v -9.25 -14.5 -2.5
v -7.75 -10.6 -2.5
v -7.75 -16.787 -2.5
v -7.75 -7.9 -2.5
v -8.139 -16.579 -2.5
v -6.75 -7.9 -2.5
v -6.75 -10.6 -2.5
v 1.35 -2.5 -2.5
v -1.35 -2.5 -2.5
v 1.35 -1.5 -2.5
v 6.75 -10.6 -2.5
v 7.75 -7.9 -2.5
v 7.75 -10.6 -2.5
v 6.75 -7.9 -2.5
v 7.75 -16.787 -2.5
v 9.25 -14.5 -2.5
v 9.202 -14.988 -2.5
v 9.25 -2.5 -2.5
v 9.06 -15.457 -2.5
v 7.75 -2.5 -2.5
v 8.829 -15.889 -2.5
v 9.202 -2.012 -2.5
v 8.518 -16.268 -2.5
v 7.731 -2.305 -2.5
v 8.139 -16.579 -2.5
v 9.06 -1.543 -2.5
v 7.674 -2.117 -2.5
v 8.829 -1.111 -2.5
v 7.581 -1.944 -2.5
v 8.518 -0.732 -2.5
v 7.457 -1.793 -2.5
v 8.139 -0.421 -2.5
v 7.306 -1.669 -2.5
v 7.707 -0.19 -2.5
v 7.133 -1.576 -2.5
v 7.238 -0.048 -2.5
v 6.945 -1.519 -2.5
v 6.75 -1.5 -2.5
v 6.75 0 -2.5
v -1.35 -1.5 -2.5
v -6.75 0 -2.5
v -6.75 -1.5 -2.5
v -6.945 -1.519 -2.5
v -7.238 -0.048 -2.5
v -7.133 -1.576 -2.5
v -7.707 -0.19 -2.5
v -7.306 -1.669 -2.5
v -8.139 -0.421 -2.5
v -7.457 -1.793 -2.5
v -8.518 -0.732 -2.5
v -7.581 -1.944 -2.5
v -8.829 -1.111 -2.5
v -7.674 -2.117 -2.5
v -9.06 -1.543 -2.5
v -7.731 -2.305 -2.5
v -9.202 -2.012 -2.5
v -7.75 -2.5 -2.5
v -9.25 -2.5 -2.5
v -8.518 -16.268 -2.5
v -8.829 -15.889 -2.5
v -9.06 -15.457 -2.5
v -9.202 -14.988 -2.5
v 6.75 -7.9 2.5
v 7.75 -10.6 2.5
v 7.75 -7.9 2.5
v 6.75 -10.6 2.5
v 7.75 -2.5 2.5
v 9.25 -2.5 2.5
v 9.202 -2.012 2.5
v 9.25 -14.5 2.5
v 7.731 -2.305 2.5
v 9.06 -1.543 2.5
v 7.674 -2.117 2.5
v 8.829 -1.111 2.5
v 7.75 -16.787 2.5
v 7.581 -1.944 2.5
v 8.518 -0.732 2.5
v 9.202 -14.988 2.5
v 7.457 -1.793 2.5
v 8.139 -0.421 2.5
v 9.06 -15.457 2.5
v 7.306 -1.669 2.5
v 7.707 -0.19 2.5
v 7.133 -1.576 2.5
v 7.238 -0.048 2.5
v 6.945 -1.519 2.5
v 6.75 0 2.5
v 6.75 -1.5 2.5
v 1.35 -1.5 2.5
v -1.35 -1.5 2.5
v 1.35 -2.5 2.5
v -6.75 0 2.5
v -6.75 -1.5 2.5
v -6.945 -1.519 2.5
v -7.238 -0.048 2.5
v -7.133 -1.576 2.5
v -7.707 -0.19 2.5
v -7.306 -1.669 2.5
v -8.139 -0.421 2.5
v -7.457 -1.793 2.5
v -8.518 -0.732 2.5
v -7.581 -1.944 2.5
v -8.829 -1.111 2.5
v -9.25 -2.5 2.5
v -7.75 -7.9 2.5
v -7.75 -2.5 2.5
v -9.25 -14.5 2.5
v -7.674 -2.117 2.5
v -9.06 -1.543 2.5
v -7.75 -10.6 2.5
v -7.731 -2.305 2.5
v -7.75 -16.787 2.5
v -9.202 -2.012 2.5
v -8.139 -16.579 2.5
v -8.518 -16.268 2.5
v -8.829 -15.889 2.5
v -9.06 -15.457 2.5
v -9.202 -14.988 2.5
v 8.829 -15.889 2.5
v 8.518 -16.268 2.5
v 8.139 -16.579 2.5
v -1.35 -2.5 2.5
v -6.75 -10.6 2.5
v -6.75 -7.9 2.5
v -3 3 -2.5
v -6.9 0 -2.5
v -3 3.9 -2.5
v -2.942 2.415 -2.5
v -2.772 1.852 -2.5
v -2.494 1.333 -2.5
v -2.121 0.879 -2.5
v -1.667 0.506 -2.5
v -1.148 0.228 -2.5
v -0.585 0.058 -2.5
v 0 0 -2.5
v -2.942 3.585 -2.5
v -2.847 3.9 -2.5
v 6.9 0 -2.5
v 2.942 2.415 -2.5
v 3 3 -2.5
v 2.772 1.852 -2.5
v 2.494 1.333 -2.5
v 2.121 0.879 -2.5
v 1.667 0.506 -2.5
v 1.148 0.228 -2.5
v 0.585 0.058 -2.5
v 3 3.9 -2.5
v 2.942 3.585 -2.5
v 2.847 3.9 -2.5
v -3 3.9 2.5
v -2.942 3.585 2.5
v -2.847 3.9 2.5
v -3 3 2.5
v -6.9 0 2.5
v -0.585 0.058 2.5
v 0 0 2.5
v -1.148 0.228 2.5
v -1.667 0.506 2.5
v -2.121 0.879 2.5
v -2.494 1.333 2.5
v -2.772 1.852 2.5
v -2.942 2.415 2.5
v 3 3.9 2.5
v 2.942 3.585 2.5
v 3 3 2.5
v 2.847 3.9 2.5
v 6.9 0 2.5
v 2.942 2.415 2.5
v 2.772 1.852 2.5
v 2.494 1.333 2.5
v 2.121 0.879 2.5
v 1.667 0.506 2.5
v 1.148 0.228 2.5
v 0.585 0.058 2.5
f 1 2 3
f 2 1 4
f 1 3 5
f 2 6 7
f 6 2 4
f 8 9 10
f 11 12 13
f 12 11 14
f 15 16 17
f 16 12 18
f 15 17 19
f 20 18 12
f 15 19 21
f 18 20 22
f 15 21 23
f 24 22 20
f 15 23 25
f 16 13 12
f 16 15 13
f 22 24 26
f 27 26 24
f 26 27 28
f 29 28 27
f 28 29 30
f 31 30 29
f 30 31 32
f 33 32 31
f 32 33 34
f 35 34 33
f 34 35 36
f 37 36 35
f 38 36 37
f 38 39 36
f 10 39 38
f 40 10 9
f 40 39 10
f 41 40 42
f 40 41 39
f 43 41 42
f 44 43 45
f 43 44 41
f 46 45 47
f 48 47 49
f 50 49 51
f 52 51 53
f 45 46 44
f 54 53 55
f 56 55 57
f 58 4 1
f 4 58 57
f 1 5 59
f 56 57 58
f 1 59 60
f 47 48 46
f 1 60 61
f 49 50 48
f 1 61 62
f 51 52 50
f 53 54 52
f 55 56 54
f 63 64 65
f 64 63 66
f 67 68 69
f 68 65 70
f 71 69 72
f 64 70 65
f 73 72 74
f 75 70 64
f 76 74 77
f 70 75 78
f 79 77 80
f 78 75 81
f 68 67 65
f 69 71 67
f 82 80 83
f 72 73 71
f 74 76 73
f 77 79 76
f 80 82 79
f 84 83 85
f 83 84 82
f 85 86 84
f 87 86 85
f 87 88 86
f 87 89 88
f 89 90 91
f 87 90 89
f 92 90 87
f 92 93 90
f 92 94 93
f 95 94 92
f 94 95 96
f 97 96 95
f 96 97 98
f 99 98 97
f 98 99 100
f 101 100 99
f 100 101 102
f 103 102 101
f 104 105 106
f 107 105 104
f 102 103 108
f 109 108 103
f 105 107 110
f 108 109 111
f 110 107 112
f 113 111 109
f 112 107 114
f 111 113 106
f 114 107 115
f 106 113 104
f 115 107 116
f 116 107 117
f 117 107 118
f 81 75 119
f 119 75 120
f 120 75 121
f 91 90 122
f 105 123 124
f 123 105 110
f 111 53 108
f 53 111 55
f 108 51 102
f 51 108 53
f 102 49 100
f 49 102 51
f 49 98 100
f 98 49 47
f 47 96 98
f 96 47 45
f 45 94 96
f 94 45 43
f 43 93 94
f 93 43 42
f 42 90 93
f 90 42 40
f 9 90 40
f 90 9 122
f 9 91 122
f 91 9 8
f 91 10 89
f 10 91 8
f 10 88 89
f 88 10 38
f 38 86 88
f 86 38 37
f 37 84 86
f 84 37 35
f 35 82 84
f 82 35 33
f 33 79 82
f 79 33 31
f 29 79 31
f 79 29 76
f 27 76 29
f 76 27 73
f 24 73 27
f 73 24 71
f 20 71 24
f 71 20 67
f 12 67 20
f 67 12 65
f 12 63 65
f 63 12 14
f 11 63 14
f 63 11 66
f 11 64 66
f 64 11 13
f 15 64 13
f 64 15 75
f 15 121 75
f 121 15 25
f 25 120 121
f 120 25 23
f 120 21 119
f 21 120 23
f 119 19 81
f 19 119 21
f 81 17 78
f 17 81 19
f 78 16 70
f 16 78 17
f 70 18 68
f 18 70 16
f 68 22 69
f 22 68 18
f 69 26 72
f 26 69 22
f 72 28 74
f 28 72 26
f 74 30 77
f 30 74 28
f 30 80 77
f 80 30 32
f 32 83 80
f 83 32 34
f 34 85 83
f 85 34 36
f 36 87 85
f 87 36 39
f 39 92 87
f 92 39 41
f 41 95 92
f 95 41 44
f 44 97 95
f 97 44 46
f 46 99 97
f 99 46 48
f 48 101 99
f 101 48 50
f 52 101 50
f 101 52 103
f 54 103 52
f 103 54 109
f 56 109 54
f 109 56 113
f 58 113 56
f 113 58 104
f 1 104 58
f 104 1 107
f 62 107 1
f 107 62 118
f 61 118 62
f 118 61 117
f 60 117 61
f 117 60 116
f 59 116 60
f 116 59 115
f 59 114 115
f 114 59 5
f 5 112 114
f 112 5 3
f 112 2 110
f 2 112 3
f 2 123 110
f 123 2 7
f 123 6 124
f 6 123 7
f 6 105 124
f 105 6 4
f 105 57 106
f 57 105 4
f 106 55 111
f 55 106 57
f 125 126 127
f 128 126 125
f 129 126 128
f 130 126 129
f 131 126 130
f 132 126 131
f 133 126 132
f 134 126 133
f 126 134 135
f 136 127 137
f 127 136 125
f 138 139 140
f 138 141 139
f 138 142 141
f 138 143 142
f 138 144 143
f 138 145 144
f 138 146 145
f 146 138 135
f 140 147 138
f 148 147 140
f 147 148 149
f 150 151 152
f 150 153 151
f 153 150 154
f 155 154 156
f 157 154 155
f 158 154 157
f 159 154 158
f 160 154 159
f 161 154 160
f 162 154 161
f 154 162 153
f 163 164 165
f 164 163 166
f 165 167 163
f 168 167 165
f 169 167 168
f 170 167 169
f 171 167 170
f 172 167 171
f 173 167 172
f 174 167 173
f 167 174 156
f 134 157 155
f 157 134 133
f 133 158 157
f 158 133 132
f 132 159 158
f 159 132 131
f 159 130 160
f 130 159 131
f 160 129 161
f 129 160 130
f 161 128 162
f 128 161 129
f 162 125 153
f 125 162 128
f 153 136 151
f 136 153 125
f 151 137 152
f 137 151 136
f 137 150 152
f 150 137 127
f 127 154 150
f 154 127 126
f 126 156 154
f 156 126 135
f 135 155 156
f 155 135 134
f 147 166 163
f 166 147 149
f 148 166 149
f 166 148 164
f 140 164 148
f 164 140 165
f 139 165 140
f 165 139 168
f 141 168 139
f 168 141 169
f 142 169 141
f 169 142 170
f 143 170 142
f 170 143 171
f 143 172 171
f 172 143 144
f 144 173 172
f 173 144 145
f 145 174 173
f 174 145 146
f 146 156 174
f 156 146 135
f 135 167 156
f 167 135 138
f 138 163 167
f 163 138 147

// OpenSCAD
// file: isosceles_trapezoid.scad
module isosceles_trapezoid(d = 5, angle = 45, h = 1, height = 1) {
	bevel_width = h/tan(angle);
	base_width = d + 2*bevel_width;
	scale_x = base_width/d;

	// turn back into 2D primitive
	projection()
		// turn flat on x plane
		rotate([90, 0, 0])
			// move back into center
			translate([0, 0, -h/2])
				// extrude with scaling into trapezoid
				linear_extrude(height = h, scale=[scale_x, 1])
					square([d, 1], center = true);
}

isosceles_trapezoid();
// file: tube_holder.scad
$fn = 32;

use <isosceles_trapezoid.scad>;

function tube_holder_outer_length(tube_diameter) = tube_diameter;

// derive bevel width from thickness so that actual bevel thickness equals
// thickness
function tube_holder_outer_height(tube_diameter, clip_factor) =
	tube_diameter/2 * (1 + clip_factor);

// allow users to query the base width of the holder so they know what room
// they must make for attaching it somewhere
function tube_holder_base_length(tube_diameter, angle, clip_factor) =
	let(bevel_width = tube_holder_outer_height(tube_diameter, clip_factor) / tan(angle))
	tube_holder_outer_length(tube_diameter) + 2*bevel_width;

module tube_holder(holder_width = 5, tube_diameter = 6, clip_factor = 0.3,
		thickness = 1.5, angle = 45) {
	outer_height = tube_holder_outer_height(tube_diameter, clip_factor);

	// move to a zero line in y direction and otherwise in center
	// so we can put it on top of other stuff
	translate([0, tube_diameter/2, -holder_width/2])
		linear_extrude(holder_width)
			difference() {
				// beveled for more technical look and better
				// overhang printing
				translate([0, -tube_diameter/2 + outer_height/2, 0])
					isosceles_trapezoid(d = tube_holder_outer_length(tube_diameter),
						h = outer_height, angle = angle);
				circle(d = tube_diameter);
			}
}

tube_holder();
// file: openbeam_clip.scad
$fn = 32;

module rounded_rectangle(width = 1, height = 1, rounding = 0) {
	if (rounding > 0) {
		non_rounded_width = width - 2*rounding;
		non_rounded_height = height - 2*rounding;

		// correct for funky minkowski displacement
		translate([-non_rounded_width/2, -non_rounded_height/2])
			minkowski() {
				square([non_rounded_width, non_rounded_height], center = true);
				translate([non_rounded_width/2, non_rounded_height/2, 0])
					circle(rounding, center = true);
			}
	} else {
		// minkowski doesn't work properly on circle with diameter 0
		square([width, height], center = true);
	}
}

function openbeam_clip_outer_width(beam_width, thickness) =
	beam_width + 2*thickness;

module openbeam_clip_cross(beam_width, rounding, thickness) {
	difference() {
		outer_width = openbeam_clip_outer_width(beam_width = beam_width,
			thickness = thickness);

		// since clip is open at the bottom, remove one thickness and
		// move down by half of that to be back in center
		translate([0, thickness/2, 0])
			rounded_rectangle(width = outer_width,
				height = outer_width - thickness,
				rounding = rounding + thickness);

		// make inner rectangle higher than outer by one thickness
		// (to be on the safe side) and shift down by
		// half of that to be centered with the outer again
		translate([0, -thickness/2, 0])
			rounded_rectangle(width = beam_width,
				height = beam_width + thickness,
				rounding = rounding);
	}
}

module openbeam_clip_stay(slot_width = 3.2, protrusion = 0.75) {
	square([slot_width, protrusion], center = true);
}

module openbeam_clip(beam_width = 15, height = 15,
		beam_slot_width = 3.2, stay_protrusion = 1,
		rounding = 1, thickness = 1.5,
		epsilon = 0.25) {
	cbw = beam_width + 2*epsilon;
	outer_width = openbeam_clip_outer_width(beam_width = cbw, thickness = thickness);

	// move back into center after extrude but put top onto y as base-line
	// for attaching things to it
	translate([0, -outer_width/2, -height/2])
		linear_extrude(height)
			union() {
				openbeam_clip_cross(beam_width = cbw,
					rounding = rounding,
					thickness = thickness);

				// add in the stays
				stay_position = cbw/2 - stay_protrusion/2;
				cbsw = beam_slot_width - 2*epsilon;
				for (stay_angle =[-90:90:90])
					rotate([0, 0, stay_angle])
						translate([0, stay_position, 0])
						openbeam_clip_stay(slot_width = cbsw,
							protrusion = stay_protrusion);
			}
}

openbeam_clip();
// main file
$fn = 32;
use <openbeam_clip.scad>;
use <tube_holder.scad>;

module openbeam_tube_clip(beam_width = 15, height = 5,
		tube_diameter = 6, clip_factor = 0.3,
		tube_holder_angle = 45,
		thickness = 1.5, epsilon = 0.25) {
	union() {
		openbeam_clip(beam_width = beam_width,
			height = height,
			thickness = thickness,
			epsilon = 0.25);

		tube_holder(tube_diameter = tube_diameter,
			clip_factor = clip_factor,
			holder_width = height,
			angle = tube_holder_angle,
			thickness = thickness);
	}
}

openbeam_tube_clip();
